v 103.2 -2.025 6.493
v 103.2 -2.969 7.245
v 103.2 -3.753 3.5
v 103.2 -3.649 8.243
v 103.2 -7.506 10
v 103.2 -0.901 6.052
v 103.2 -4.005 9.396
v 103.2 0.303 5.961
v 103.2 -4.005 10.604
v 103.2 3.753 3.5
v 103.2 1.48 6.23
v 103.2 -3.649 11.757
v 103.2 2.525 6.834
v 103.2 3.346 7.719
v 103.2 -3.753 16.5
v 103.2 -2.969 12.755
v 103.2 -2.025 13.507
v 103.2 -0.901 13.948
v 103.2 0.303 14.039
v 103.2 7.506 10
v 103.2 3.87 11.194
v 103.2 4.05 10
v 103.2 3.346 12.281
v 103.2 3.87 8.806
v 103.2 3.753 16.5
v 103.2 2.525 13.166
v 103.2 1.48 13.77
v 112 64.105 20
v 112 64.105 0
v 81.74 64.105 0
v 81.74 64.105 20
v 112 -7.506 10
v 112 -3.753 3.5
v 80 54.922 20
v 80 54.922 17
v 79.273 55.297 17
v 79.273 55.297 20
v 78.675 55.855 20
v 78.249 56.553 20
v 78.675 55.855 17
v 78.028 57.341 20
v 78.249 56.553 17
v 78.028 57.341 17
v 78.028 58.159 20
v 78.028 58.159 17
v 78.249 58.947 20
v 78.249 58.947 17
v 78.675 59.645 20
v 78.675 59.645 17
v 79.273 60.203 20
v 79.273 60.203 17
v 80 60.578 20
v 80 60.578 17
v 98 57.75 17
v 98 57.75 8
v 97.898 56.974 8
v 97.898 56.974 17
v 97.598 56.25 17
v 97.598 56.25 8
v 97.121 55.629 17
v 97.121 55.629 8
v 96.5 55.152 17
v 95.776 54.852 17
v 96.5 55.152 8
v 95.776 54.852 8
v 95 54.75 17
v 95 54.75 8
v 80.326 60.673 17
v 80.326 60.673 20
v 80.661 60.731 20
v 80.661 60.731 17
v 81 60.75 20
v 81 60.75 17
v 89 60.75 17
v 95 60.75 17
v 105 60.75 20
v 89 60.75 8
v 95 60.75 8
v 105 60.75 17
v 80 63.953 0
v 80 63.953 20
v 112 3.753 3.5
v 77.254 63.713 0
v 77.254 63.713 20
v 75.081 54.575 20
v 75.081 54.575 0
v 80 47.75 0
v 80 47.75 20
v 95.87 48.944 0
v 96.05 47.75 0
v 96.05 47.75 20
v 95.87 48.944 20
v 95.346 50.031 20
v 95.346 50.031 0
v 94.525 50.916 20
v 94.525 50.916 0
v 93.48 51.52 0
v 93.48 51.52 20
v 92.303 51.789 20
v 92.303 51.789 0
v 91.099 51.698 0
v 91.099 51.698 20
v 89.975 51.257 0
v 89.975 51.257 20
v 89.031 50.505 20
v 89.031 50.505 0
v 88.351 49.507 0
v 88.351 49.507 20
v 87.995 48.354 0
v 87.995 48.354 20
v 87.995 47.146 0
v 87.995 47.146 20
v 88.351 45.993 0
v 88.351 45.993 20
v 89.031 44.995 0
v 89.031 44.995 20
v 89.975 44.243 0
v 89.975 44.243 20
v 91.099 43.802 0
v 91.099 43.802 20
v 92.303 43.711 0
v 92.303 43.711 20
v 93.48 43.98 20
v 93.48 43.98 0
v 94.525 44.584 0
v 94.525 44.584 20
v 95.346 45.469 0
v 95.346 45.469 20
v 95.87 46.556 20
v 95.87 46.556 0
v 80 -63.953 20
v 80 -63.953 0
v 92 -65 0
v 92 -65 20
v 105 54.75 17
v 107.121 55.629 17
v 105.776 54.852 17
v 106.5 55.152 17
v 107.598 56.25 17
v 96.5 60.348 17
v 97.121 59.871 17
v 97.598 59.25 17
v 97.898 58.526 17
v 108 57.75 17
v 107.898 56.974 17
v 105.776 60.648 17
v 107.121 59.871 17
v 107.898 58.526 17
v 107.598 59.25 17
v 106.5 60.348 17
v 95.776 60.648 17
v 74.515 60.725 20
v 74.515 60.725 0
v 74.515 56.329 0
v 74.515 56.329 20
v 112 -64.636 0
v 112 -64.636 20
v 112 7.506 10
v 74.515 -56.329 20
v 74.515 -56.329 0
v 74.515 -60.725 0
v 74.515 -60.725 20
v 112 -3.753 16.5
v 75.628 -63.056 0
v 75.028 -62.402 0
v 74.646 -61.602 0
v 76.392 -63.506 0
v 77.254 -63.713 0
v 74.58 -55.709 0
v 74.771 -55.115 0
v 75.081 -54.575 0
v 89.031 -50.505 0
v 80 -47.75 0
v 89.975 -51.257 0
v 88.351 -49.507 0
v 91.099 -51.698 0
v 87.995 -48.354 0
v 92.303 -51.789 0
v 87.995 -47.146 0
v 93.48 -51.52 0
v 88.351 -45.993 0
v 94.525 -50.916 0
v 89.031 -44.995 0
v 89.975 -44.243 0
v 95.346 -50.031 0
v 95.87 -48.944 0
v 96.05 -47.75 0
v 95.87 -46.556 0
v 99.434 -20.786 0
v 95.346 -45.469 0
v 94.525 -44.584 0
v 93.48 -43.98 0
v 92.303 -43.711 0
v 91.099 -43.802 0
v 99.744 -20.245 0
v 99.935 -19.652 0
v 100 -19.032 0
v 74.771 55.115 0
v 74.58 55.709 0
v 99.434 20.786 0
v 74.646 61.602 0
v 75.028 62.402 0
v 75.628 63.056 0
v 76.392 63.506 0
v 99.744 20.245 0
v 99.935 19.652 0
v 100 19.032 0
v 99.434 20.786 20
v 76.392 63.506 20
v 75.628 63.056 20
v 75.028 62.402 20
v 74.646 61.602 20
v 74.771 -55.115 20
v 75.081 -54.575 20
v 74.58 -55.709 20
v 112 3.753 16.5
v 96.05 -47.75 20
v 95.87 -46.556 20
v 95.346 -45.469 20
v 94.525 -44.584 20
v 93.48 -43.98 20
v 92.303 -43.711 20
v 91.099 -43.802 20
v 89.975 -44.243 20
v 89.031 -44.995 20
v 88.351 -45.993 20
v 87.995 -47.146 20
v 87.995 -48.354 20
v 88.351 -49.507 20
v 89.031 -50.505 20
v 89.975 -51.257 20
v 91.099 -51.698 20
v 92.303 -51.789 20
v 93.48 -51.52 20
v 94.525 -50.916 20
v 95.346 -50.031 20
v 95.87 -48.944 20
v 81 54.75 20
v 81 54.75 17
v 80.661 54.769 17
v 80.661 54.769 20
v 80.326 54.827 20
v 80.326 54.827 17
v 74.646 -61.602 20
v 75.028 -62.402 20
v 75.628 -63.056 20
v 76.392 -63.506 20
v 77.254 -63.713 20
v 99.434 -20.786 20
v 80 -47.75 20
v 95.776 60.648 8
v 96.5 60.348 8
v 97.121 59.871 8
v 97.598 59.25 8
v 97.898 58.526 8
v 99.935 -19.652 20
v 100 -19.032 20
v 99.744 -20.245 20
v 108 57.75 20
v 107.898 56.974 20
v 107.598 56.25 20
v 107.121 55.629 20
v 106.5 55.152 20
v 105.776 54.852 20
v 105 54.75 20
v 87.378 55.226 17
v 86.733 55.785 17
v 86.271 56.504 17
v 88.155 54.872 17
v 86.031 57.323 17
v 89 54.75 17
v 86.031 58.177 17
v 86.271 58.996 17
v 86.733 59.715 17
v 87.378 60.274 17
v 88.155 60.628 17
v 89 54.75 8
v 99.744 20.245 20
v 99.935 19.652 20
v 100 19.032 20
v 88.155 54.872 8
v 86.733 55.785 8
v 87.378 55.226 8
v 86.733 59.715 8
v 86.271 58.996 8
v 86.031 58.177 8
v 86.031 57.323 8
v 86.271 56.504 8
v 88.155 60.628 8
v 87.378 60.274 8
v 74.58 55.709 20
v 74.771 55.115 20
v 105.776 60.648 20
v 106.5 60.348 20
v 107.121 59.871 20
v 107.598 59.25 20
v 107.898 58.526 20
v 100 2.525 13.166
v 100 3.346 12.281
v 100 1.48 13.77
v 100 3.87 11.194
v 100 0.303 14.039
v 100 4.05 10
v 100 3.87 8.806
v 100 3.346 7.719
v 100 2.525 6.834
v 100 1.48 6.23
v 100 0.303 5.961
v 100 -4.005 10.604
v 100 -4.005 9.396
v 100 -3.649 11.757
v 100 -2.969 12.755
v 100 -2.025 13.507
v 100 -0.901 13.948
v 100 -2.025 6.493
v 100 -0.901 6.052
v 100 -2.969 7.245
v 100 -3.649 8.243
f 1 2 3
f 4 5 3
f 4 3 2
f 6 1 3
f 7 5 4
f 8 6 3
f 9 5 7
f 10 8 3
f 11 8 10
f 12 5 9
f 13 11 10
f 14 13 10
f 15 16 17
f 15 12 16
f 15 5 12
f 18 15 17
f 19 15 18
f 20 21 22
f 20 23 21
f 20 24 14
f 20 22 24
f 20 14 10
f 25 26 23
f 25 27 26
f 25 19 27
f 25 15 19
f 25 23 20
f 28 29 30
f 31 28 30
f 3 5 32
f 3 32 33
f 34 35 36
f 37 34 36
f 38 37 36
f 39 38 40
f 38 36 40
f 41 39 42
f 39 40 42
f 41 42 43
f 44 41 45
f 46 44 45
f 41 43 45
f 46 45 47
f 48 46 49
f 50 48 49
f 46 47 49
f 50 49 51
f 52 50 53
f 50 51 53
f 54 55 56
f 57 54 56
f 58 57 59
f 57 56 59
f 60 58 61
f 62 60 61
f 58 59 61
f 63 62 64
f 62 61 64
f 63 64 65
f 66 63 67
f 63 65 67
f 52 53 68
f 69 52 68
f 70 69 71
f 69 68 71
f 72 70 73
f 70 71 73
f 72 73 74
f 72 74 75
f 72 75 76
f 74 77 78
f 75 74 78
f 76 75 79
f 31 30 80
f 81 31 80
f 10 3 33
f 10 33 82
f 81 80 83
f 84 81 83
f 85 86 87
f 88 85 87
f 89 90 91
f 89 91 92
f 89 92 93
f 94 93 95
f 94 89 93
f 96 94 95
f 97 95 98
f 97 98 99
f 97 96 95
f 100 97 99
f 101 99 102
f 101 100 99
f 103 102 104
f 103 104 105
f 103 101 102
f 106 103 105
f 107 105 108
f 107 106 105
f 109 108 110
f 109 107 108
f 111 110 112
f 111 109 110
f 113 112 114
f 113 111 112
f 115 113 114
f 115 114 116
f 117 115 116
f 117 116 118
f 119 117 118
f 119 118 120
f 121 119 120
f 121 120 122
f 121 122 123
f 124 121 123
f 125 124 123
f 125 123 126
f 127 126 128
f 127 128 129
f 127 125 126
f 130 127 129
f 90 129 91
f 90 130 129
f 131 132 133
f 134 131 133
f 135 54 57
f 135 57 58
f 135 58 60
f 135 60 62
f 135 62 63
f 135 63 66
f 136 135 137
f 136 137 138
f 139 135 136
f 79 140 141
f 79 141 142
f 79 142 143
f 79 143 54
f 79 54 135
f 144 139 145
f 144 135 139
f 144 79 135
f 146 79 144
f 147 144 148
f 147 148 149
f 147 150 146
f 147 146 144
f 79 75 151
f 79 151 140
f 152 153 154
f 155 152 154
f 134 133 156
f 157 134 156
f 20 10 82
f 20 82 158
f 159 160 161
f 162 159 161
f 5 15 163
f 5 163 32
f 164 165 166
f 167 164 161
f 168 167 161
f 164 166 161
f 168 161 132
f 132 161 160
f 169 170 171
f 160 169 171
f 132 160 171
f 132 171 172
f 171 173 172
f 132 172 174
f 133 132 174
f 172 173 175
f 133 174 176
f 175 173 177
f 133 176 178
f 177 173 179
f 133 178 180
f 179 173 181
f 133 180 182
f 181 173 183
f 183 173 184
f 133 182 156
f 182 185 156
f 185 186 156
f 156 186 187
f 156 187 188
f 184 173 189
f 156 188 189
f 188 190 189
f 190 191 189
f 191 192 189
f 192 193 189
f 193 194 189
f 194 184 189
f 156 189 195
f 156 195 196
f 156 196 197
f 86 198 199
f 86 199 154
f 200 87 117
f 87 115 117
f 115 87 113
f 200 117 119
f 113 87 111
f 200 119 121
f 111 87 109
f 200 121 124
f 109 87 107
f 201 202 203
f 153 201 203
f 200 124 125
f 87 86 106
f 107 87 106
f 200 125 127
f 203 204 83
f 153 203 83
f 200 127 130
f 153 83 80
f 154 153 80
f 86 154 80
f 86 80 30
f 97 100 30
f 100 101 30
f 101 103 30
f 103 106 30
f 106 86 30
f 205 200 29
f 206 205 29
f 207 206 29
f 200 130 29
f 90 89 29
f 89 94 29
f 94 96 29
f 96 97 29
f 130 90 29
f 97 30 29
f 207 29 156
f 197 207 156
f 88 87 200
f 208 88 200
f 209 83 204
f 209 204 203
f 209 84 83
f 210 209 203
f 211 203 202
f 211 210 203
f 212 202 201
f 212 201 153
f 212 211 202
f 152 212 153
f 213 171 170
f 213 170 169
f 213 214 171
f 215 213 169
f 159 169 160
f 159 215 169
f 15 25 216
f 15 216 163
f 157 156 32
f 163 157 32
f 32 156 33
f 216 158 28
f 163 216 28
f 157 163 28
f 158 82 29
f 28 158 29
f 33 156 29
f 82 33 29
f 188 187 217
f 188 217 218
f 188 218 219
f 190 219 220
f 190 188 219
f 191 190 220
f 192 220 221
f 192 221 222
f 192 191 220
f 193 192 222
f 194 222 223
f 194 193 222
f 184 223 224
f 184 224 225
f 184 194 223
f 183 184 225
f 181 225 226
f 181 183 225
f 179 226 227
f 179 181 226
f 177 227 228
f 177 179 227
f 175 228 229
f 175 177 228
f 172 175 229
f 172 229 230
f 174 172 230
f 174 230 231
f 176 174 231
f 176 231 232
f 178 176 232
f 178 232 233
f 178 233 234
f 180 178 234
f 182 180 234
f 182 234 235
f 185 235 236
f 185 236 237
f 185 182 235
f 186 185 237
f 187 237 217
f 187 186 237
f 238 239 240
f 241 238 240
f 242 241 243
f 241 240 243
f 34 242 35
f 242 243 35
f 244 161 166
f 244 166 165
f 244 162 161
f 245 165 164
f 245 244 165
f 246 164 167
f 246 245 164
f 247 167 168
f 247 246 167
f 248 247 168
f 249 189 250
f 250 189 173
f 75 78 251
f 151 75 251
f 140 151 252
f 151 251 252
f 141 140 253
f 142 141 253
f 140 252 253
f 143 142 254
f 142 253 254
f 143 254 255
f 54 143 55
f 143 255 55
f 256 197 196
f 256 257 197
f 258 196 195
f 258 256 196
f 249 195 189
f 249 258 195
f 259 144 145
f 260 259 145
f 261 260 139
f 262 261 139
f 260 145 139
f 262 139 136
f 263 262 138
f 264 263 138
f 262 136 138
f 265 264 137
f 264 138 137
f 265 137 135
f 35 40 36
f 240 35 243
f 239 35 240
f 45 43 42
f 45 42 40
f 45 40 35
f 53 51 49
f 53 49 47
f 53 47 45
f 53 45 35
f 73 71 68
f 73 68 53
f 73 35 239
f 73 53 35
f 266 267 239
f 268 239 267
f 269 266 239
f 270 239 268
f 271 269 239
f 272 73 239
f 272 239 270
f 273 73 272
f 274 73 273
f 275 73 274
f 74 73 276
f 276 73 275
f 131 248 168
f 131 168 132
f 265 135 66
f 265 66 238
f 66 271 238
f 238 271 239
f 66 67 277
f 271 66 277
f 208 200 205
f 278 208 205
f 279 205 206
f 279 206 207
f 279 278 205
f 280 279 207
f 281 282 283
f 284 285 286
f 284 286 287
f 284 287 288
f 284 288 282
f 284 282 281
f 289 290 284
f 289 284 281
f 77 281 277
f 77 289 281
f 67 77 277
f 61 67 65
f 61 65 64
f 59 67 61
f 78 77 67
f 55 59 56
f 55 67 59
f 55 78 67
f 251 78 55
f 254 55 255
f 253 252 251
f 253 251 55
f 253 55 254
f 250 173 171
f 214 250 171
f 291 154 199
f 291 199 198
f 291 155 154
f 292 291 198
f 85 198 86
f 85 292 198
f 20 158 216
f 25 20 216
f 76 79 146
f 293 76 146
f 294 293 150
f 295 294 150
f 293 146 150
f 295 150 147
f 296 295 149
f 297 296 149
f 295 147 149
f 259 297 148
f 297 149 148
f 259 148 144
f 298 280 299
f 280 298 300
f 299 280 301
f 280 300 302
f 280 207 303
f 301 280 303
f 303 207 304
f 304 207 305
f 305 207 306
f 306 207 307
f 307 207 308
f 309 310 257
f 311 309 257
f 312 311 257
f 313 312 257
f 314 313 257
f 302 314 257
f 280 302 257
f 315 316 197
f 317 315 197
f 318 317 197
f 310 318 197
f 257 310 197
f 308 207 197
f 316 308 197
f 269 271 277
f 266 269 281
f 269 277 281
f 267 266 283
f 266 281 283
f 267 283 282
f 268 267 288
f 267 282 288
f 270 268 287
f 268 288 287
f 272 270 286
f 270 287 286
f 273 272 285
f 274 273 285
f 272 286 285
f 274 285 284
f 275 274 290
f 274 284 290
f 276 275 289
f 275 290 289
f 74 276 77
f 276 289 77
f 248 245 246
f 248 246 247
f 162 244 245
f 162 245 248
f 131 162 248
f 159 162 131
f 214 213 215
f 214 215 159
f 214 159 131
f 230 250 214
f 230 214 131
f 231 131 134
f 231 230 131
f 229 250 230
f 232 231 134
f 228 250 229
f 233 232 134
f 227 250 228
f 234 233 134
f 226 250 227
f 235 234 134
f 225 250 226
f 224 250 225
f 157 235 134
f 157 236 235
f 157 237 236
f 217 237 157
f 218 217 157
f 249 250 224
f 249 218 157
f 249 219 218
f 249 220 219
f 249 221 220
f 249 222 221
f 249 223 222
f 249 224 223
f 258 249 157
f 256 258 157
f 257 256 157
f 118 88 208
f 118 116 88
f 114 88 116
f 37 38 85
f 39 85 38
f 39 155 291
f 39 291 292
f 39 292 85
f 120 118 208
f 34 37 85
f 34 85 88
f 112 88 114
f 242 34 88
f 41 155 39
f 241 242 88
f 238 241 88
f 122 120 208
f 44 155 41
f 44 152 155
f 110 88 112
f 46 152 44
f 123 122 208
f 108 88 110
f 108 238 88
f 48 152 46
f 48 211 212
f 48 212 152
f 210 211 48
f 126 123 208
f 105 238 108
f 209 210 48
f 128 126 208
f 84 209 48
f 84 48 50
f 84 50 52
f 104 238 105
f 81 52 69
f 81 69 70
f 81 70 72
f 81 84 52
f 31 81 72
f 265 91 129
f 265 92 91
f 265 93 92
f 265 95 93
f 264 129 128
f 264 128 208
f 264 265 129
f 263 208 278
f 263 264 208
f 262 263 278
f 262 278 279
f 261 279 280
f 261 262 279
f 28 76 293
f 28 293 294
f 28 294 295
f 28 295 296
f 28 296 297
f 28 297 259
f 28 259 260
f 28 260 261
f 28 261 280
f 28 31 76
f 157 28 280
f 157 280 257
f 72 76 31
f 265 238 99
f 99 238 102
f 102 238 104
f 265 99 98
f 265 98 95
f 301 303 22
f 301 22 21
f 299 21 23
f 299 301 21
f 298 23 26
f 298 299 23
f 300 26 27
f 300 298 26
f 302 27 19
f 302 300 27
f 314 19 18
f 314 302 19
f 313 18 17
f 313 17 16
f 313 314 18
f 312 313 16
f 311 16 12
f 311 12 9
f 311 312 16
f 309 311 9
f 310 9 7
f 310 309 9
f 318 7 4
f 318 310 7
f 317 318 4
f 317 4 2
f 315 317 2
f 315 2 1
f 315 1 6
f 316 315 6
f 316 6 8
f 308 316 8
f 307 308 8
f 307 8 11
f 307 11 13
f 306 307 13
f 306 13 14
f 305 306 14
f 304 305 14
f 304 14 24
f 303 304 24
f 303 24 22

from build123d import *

# Parameters (mm, degrees)
F0_R     = 4.05
F1_DEPTH = 20
F2_DEPTH = 17
F3_R     = 3
F4_R     = 4.05
F5_DEPTH = 219.9
F6_START = 103.2
F6_DEPTH = 43.7
F7_DEPTH = 8


with BuildPart() as f1:
    # F0 (on Top) → F1 (new body)
    with BuildSketch(Plane.XY):
        with BuildLine():
            Line((80, 54.9215728753), (80, 47.75))
            Line((80, 47.75), (100, 20))
            Line((100, 20), (100, 0))
            Line((100, 0), (100, -20))
            Line((100, -20), (80, -47.75))
            Line((80, -47.75), (80, -63.952777299))
            Line((80, -63.952777299), (92, -65))
            Line((92, -65), (112, -64.6363035163))
            Line((112, -64.6363035163), (112, 0))
            Line((112, 0), (112, 64.1046091914))
            Line((112, 64.1046091914), (81.7398235416, 64.1046091914))
            Line((81.7398235416, 64.1046091914), (80, 63.952777299))
            Line((80, 63.952777299), (80, 60.5784271247))
            ThreePointArc((80, 60.5784271247), (80.4926940638, 60.706795679), (81, 60.75))
            Line((81, 60.75), (89, 60.75))
            Line((89, 60.75), (95, 60.75))
            Line((95, 60.75), (105, 60.75))
            ThreePointArc((105, 60.75), (107.1213203436, 59.8713203436), (108, 57.75))
            ThreePointArc((108, 57.75), (107.1213203436, 55.6286796564), (105, 54.75))
            Line((105, 54.75), (95, 54.75))
            Line((95, 54.75), (89, 54.75))
            Line((89, 54.75), (81, 54.75))
            ThreePointArc((81, 54.75), (80.4926940638, 54.793204321), (80, 54.9215728753))
        make_face()
        with Locations((92, -47.75)):
            Circle(F0_R, mode=Mode.SUBTRACT)
        with Locations((92, 47.75)):
            Circle(F0_R, mode=Mode.SUBTRACT)
        Polygon((80, -63.952777299), (80, -47.75), (74.5151937008, -55.3601687402), (74.5151937008, -63.4741261601), align=None)
        with BuildLine():
            Line((74.5151937008, 55.3601687402), (80, 47.75))
            Line((80, 47.75), (80, 54.9215728753))
            ThreePointArc((80, 54.9215728753), (78, 57.75), (80, 60.5784271247))
            Line((80, 60.5784271247), (80, 63.952777299))
            Line((80, 63.952777299), (74.5151937008, 63.4741261601))
            Line((74.5151937008, 63.4741261601), (74.5151937008, 55.3601687402))
        make_face()
    extrude(amount=F1_DEPTH)

    # F0 (on Top) → F2 (join)
    with BuildSketch(Plane.XY):
        with BuildLine():
            ThreePointArc((105, 60.75), (102, 57.75), (105, 54.75))
            ThreePointArc((105, 54.75), (107.1213203436, 55.6286796564), (108, 57.75))
            ThreePointArc((108, 57.75), (107.1213203436, 59.8713203436), (105, 60.75))
        make_face()
        with BuildLine():
            Line((80, 60.5784271247), (80, 54.9215728753))
            ThreePointArc((80, 54.9215728753), (80.4926940638, 54.793204321), (81, 54.75))
            ThreePointArc((81, 54.75), (83.1213203436, 55.6286796564), (84, 57.75))
            ThreePointArc((84, 57.75), (83.1213203436, 59.8713203436), (81, 60.75))
            ThreePointArc((81, 60.75), (80.4926940638, 60.706795679), (80, 60.5784271247))
        make_face()
        with BuildLine():
            ThreePointArc((80, 60.5784271247), (78, 57.75), (80, 54.9215728753))
            Line((80, 54.9215728753), (80, 60.5784271247))
        make_face()
        with BuildLine():
            ThreePointArc((84, 57.75), (83.1213203436, 55.6286796564), (81, 54.75))
            Line((81, 54.75), (89, 54.75))
            ThreePointArc((89, 54.75), (86, 57.75), (89, 60.75))
            Line((89, 60.75), (81, 60.75))
            ThreePointArc((81, 60.75), (83.1213203436, 59.8713203436), (84, 57.75))
        make_face()
        with BuildLine():
            ThreePointArc((98, 57.75), (97.1213203436, 55.6286796564), (95, 54.75))
            Line((95, 54.75), (105, 54.75))
            ThreePointArc((105, 54.75), (102, 57.75), (105, 60.75))
            Line((105, 60.75), (95, 60.75))
            ThreePointArc((95, 60.75), (97.1213203436, 59.8713203436), (98, 57.75))
        make_face()
    extrude(amount=F2_DEPTH)

    # F3
    f3_edges = [f1.edges().sort_by_distance(p)[0] for p in [
        (74.515194, -55.360169, 10),
        (74.515194, -63.474126, 10),
        (100, -20, 10),
        (100, 20, 10),
        (74.515194, 55.360169, 10),
        (74.515194, 63.474126, 10),
    ]]
    fillet(f3_edges, radius=F3_R)

    # F4 (on Right) → F5 (cut)
    with BuildSketch(Plane.YZ):
        with Locations((0, 10)):
            Circle(F4_R)
    extrude(amount=F5_DEPTH, mode=Mode.SUBTRACT)

    # F4 (on Right) → F6 (cut)
    with BuildSketch(Plane.YZ.offset(F6_START)):
        Polygon((-3.7527767497, 3.5), (3.7527767497, 3.5), (7.5055534995, 10), (3.7527767497, 16.5), (-3.7527767497, 16.5), (-7.5055534995, 10), align=None)
        with Locations((0, 10)):
            Circle(F4_R, mode=Mode.SUBTRACT)
    extrude(amount=F6_DEPTH, mode=Mode.SUBTRACT)

    # F0 (on Top) → F7 (join)
    with BuildSketch(Plane.XY):
        with BuildLine():
            ThreePointArc((89, 60.75), (86, 57.75), (89, 54.75))
            ThreePointArc((89, 54.75), (91.1213203436, 55.6286796564), (92, 57.75))
            ThreePointArc((92, 57.75), (91.1213203436, 59.8713203436), (89, 60.75))
        make_face()
        with BuildLine():
            Line((95, 60.75), (89, 60.75))
            ThreePointArc((89, 60.75), (91.1213203436, 59.8713203436), (92, 57.75))
            ThreePointArc((92, 57.75), (92.8786796564, 59.8713203436), (95, 60.75))
        make_face()
        with BuildLine():
            ThreePointArc((92, 57.75), (92.8786796564, 55.6286796564), (95, 54.75))
            ThreePointArc((95, 54.75), (97.1213203436, 55.6286796564), (98, 57.75))
            ThreePointArc((98, 57.75), (97.1213203436, 59.8713203436), (95, 60.75))
            ThreePointArc((95, 60.75), (92.8786796564, 59.8713203436), (92, 57.75))
        make_face()
        with BuildLine():
            ThreePointArc((92, 57.75), (91.1213203436, 55.6286796564), (89, 54.75))
            Line((89, 54.75), (95, 54.75))
            ThreePointArc((95, 54.75), (92.8786796564, 55.6286796564), (92, 57.75))
        make_face()
    extrude(amount=F7_DEPTH)


solid = f1.part
